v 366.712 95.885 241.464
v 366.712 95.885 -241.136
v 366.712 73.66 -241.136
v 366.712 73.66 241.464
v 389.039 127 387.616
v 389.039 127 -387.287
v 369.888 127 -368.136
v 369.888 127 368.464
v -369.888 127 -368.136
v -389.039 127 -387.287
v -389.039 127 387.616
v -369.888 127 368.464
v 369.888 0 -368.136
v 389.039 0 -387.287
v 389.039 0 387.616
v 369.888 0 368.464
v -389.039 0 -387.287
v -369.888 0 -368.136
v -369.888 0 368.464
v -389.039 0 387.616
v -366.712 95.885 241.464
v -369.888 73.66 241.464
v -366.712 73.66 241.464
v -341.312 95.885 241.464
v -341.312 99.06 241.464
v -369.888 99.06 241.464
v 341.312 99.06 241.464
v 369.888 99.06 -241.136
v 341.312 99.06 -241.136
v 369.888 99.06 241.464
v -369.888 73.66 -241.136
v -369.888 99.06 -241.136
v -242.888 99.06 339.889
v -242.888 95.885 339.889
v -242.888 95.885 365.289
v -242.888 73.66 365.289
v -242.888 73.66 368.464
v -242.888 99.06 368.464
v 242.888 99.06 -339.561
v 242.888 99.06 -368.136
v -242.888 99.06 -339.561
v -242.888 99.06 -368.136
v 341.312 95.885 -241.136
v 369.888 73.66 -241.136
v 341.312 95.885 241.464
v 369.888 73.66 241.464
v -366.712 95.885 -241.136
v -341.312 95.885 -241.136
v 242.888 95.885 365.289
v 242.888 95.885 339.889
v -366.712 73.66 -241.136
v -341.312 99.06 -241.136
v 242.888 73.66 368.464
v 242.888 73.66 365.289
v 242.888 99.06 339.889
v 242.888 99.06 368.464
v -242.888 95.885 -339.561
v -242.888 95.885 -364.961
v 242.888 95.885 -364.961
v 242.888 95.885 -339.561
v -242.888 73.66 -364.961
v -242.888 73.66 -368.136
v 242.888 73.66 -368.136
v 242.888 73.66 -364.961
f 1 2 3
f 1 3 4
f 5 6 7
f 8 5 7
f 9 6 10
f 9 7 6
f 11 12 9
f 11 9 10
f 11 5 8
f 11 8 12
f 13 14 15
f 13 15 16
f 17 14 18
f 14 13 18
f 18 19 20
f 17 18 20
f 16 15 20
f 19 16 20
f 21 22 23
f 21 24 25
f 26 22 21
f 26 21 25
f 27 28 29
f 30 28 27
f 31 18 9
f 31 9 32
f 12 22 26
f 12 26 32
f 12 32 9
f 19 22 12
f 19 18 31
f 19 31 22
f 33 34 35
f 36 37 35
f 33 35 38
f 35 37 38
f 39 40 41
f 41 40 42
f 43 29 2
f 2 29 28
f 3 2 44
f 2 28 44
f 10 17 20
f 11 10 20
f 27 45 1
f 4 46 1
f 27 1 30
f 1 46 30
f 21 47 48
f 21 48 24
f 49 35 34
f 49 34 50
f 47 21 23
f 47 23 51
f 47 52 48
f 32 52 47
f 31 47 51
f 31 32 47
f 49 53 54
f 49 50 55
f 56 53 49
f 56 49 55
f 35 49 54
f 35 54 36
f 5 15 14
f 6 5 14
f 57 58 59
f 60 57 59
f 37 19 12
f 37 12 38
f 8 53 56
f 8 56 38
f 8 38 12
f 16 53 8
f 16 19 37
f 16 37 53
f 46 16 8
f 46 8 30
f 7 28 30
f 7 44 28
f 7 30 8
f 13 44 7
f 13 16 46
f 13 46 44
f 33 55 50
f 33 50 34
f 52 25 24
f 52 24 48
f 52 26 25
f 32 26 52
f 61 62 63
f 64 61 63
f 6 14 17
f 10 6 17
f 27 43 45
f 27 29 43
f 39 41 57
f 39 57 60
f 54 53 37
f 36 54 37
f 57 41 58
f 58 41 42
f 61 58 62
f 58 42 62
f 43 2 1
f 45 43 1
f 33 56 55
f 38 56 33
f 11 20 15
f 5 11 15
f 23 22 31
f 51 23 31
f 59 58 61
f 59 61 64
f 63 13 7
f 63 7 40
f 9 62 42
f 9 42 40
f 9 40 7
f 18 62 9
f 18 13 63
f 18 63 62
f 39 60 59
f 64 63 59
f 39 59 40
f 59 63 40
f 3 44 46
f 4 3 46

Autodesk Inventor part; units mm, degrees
ref_plane "YZ Plane" through (0, 0, 0) normal (1, 0, 0) x (0, 1, 0)
ref_plane "XZ Plane" through (0, 0, 0) normal (0, 1, 0) x (-1, 0, 0)
ref_plane "XY Plane" through (0, 0, 0) normal (0, 0, 1) x (1, 0, 0)
sketch "Sketch15" plane through (0, 0, 0) normal (0, 1, 0) x (-1, 0, 0)
  line L0 (-369.8875, -368.1356) -> (369.8875, -368.1356)
  line L1 (369.8875, -368.1356) -> (369.8875, 368.4644)
  line L2 (369.8875, 368.4644) -> (-369.8875, 368.4644)
  line L3 (-369.8875, 368.4644) -> (-369.8875, -368.1356)
  line L4 (-389.0391, -387.2872) -> (389.0391, -387.2872)
  line L5 (389.0391, -387.2872) -> (389.0391, 387.616)
  line L6 (389.0391, 387.616) -> (-389.0391, 387.616)
  line L7 (-389.0391, 387.616) -> (-389.0391, -387.2872)
  dimension "d84" = 736.6
  dimension "d85" = 739.775
  dimension "d86" = 19.1516
  dimension "d87" = 19.1516
  dimension "d88" = 19.1516
  dimension "d89" = 19.1516
extrude "Extrusion12" add sketch "Sketch15" along normal blind 127
sketch "Sketch16" plane through (-369.8875, 0, -368.1356) normal (1, 0, 0) x (0, 0, -1)
  line L0 (-609.6, 73.66) -> (-127, 73.66)
  line L1 (-127, 73.66) -> (-127, 99.06)
  line L2 (-127, 99.06) -> (-609.6, 99.06)
  line L3 (-609.6, 99.06) -> (-609.6, 73.66)
  line L4 (-736.6, 0) -> (-736.6, 127) projected
  line L5 (0, 0) -> (0, 127) projected
  line L6 (0, 0) -> (-736.6, 0) projected
  point P0 (-368.1356, 0)
  dimension "d92" = 127
  dimension "d93" = 127
  dimension "d94" = 73.66
  dimension "d95" = 25.4
sketch "Sketch17" plane through (-369.8875, 0, -368.1356) normal (0, 0, 1) x (1, 0, 0)
  line L0 (127, 73.66) -> (612.775, 73.66)
  line L1 (612.775, 73.66) -> (612.775, 99.06)
  line L2 (612.775, 99.06) -> (127, 99.06)
  line L3 (127, 99.06) -> (127, 73.66)
  line L4 (0, 0) -> (0, 127) projected
  line L5 (739.775, 0) -> (739.775, 127) projected
  line L6 (739.775, 0) -> (0, 0) projected
  point P0 (369.8875, 0)
  dimension "d96" = 127
  dimension "d97" = 127
  dimension "d98" = 25.4
  dimension "d99" = 73.66
sketch "Sketch18" plane through (369.8875, 0, 368.4644) normal (-1, 0, 0) x (0, 0, 1)
  line L0 (-609.6, 73.66) -> (-127, 73.66)
  line L1 (-127, 73.66) -> (-127, 99.06)
  line L2 (-127, 99.06) -> (-609.6, 99.06)
  line L3 (-609.6, 99.06) -> (-609.6, 73.66)
  line L4 (-736.6, 0) -> (-736.6, 127) projected
  line L5 (0, 0) -> (0, 127) projected
  line L6 (0, 0) -> (-736.6, 0) projected
  point P0 (-368.4644, 0)
  dimension "d100" = 127
  dimension "d101" = 127
  dimension "d102" = 25.4
  dimension "d103" = 73.66
sketch "Sketch19" plane through (369.8875, 0, 368.4644) normal (0, 0, -1) x (-1, 0, 0)
  line L0 (127, 73.66) -> (612.775, 73.66)
  line L1 (612.775, 73.66) -> (612.775, 99.06)
  line L2 (612.775, 99.06) -> (127, 99.06)
  line L3 (127, 99.06) -> (127, 73.66)
  line L4 (739.775, 0) -> (739.775, 127) projected
  line L5 (739.775, 0) -> (0, 0) projected
  point P0 (369.8875, 0)
  point P1 (0, 127)
  dimension "d104" = 127
  dimension "d105" = 127
  dimension "d106" = 25.4
  dimension "d107" = 73.66
extrude "Extrusion13" add sketch "Sketch19" along normal blind 3.175
extrude "Extrusion14" add sketch "Sketch16" along normal blind 3.175
extrude "Extrusion15" add sketch "Sketch18" along normal blind 3.175
extrude "Extrusion16" add sketch "Sketch17" along normal blind 3.175
sketch "Sketch20" plane through (-369.8875, 0, -364.9606) normal (0, 0, 1) x (1, 0, 0)
  line L0 (612.775, 99.06) -> (127, 99.06) projected
  line L1 (127, 99.06) -> (127, 73.66) projected
  line L2 (612.775, 99.06) -> (127, 99.06)
  line L3 (127, 99.06) -> (127, 95.885)
  line L4 (127, 95.885) -> (612.775, 95.885)
  line L5 (612.775, 95.885) -> (612.775, 99.06)
  point P0 (369.8875, 0)
  dimension "d116" = 3.175
extrude "Extrusion17" add sketch "Sketch20" along normal blind 25.4
sketch "Sketch21" plane through (366.7125, 0, 368.4644) normal (-1, 0, 0) x (0, 0, 1)
  line L0 (-609.6, 99.06) -> (-127, 99.06) projected
  line L1 (-609.6, 99.06) -> (-609.6, 73.66) projected
  line L2 (-127, 99.06) -> (-609.6, 99.06)
  line L3 (-609.6, 99.06) -> (-609.6, 95.885)
  line L4 (-609.6, 95.885) -> (-127, 95.885)
  line L5 (-127, 95.885) -> (-127, 99.06)
  point P0 (-368.4644, 0)
  dimension "d119" = 3.175
sketch "Sketch22" plane through (369.8875, 0, 365.2894) normal (0, 0, -1) x (-1, 0, 0)
  line L0 (612.775, 73.66) -> (612.775, 99.06) projected
  line L1 (127, 99.06) -> (612.775, 99.06)
  line L2 (612.775, 99.06) -> (612.775, 95.885)
  line L3 (612.775, 95.885) -> (127, 95.885)
  line L4 (127, 95.885) -> (127, 99.06)
  point P0 (369.8875, 0)
  dimension "d120" = 3.175
extrude "Extrusion18" add sketch "Sketch22" along normal blind 25.4
extrude "Extrusion19" add sketch "Sketch21" along normal blind 25.4
sketch "Sketch23" plane through (-366.7125, 0, -368.1356) normal (1, 0, 0) x (0, 0, -1)
  line L0 (-609.6, 99.06) -> (-127, 99.06) projected
  line L1 (-127, 99.06) -> (-127, 73.66) projected
  line L2 (-609.6, 99.06) -> (-127, 99.06)
  line L3 (-127, 99.06) -> (-127, 95.885)
  line L4 (-127, 95.885) -> (-609.6, 95.885)
  line L5 (-609.6, 95.885) -> (-609.6, 99.06)
  point P0 (-368.1356, 0)
  dimension "d125" = 3.175
extrude "Extrusion20" add sketch "Sketch23" along normal blind 25.4
equation "\"d87\" = d86"
equation "\"d88\" = d86"
equation "\"d89\" = d86"
equation "\"d93\" = d92"
equation "\"d96\" = d92"
equation "\"d97\" = d92"
equation "\"d100\" = d92"
equation "\"d101\" = d92"
equation "\"d104\" = d92"
equation "\"d105\" = d92"
equation "\"d119\" = d116"
equation "\"d120\" = d116"
equation "\"d125\" = d116"
properties part number "Bumper"
